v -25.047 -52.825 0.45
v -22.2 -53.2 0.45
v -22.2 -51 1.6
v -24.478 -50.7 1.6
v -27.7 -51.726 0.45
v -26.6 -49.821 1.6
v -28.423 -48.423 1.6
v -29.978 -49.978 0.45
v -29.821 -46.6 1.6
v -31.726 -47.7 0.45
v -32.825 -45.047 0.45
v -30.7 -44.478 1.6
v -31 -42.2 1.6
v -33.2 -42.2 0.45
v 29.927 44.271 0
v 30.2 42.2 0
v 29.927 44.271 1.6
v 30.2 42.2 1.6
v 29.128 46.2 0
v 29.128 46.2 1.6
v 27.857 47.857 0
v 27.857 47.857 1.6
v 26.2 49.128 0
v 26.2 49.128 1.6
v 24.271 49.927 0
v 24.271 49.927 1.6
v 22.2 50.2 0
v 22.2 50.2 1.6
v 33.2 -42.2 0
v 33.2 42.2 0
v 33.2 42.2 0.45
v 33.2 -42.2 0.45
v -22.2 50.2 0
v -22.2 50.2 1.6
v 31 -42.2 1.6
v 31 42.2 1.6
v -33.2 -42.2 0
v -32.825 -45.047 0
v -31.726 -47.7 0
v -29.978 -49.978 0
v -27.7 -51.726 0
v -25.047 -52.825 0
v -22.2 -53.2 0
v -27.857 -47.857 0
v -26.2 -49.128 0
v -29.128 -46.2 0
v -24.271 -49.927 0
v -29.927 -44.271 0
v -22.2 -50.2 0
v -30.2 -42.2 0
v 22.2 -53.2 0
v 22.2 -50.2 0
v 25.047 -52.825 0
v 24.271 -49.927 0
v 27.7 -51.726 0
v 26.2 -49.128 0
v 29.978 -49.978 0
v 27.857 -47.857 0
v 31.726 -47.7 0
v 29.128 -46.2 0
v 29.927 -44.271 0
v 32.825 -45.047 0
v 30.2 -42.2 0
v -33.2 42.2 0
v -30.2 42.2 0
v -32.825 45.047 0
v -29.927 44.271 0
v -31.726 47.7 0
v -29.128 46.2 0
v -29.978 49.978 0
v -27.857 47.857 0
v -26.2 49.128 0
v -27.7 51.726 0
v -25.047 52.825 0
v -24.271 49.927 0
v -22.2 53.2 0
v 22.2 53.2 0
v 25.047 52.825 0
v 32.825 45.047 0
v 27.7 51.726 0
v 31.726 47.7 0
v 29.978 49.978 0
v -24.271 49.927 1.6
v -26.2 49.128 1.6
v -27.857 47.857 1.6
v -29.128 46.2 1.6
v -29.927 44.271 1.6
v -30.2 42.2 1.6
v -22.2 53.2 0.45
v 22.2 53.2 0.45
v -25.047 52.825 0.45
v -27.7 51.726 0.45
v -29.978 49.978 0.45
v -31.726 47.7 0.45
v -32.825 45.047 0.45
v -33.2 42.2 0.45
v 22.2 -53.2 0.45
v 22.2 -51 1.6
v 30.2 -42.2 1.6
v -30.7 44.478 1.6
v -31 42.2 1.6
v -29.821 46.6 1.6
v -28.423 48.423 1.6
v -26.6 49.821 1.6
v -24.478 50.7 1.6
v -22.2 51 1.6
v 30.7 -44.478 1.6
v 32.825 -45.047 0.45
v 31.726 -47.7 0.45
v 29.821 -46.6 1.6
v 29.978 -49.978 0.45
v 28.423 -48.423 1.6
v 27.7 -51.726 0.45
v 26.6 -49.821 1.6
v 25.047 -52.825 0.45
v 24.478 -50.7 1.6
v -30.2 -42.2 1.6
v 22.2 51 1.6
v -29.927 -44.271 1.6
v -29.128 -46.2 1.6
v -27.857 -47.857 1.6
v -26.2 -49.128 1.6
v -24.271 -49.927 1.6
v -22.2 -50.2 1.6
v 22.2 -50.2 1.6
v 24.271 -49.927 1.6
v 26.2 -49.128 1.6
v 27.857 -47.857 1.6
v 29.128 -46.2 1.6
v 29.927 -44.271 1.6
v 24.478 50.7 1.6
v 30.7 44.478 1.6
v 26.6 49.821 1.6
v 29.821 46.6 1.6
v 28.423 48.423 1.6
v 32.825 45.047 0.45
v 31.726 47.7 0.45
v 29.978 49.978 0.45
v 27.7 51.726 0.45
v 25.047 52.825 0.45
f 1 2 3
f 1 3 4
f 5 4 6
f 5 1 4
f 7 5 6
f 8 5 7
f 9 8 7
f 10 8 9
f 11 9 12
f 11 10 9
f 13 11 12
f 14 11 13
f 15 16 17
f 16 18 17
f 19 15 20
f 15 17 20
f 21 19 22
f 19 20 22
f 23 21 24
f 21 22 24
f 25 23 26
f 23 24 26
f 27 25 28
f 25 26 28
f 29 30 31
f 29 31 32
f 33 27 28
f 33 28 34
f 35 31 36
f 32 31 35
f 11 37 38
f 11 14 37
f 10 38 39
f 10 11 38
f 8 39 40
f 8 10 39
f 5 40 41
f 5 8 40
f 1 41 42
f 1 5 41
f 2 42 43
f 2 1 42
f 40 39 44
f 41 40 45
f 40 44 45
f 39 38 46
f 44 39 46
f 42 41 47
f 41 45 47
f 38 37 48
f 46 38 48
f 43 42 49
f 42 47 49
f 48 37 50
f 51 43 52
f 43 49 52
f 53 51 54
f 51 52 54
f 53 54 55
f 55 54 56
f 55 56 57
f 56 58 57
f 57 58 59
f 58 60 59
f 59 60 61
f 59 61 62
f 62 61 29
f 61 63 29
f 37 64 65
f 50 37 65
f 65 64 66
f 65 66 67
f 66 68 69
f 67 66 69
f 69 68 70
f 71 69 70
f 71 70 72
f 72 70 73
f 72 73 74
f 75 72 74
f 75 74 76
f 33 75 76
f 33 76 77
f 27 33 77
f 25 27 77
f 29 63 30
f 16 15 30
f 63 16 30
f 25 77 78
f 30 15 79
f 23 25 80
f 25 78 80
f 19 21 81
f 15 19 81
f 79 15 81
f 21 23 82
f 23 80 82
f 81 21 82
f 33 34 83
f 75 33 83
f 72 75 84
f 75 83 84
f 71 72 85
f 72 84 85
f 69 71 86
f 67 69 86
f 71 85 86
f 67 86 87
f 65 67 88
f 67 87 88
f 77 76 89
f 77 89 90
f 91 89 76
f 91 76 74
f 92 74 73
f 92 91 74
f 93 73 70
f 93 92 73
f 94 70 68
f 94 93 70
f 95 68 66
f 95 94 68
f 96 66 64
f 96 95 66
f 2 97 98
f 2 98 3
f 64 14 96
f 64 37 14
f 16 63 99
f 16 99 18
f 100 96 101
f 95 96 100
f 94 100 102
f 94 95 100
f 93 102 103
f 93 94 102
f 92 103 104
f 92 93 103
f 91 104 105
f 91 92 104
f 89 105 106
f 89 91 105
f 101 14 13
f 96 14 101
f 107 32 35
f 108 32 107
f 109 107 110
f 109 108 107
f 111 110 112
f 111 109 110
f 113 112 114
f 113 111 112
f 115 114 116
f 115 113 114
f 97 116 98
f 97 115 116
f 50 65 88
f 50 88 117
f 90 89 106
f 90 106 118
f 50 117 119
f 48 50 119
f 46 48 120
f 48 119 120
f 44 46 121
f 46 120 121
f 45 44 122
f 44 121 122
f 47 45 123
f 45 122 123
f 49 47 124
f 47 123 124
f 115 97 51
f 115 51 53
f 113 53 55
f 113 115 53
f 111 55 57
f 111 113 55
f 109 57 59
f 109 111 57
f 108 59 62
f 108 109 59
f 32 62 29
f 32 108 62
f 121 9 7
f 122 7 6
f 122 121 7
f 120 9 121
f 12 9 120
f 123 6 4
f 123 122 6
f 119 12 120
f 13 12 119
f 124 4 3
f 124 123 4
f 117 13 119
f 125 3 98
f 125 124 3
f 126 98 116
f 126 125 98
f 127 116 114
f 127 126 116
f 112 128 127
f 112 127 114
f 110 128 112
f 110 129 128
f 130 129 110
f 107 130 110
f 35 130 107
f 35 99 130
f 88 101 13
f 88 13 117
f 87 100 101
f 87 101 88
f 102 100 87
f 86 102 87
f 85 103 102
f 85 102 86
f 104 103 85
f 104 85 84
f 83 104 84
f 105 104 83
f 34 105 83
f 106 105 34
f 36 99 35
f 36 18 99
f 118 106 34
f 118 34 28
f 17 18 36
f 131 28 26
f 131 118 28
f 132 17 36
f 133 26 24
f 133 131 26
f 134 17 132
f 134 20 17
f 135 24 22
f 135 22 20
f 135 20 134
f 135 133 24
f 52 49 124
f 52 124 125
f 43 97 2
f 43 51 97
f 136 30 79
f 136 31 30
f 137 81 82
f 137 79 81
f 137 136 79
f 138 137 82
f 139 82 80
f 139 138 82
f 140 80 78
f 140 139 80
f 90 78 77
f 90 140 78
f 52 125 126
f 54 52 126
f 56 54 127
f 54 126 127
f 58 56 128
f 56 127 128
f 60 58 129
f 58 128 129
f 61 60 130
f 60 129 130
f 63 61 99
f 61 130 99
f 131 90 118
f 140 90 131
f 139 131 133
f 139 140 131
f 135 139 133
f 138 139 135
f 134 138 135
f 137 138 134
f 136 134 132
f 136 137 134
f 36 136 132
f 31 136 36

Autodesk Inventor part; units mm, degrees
ref_plane "YZ Plane" through (0, 0, 0) normal (1, 0, 0) x (0, 1, 0)
ref_plane "XZ Plane" through (0, 0, 0) normal (0, 1, 0) x (-1, 0, 0)
ref_plane "XY Plane" through (0, 0, 0) normal (0, 0, 1) x (1, 0, 0)
sketch "Esquisse1" plane through (0, 0, 0) normal (0, 0, 1) x (1, 0, 0)
  line L0 (33.2, -53.2) -> (-33.2, -53.2)
  line L1 (-33.2, -53.2) -> (-33.2, 53.2)
  line L2 (-33.2, 53.2) -> (33.2, 53.2)
  line L3 (33.2, 53.2) -> (33.2, -53.2)
  line L4 (33.2, -53.2) -> (-33.2, 53.2) construction
  line L5 (-33.2, -53.2) -> (33.2, 53.2) construction
  line L6 (30.2, 50.2) -> (-30.2, 50.2)
  line L7 (-30.2, 50.2) -> (-30.2, -50.2)
  line L8 (-30.2, -50.2) -> (30.2, -50.2)
  line L9 (30.2, -50.2) -> (30.2, 50.2)
  point P0 (0, 0)
  dimension "d0" = 66.4
  dimension "d1" = 106.4
  dimension "d2" = 3
extrude "Extrusion1" add sketch "Esquisse1" along normal blind 1.6
fillet "Congé1" radius 11 4 edges at (-33.2, 53.2, 0.8) (33.2, 53.2, 0.8) (33.2, -53.2, 0.8) (-33.2, -53.2, 0.8)
fillet "Congé1" radius 8 4 edges at (30.2, -50.2, 0.8) (-30.2, -50.2, 0.8) (-30.2, 50.2, 0.8) (30.2, 50.2, 0.8)
chamfer "Chanfrein1" distance 2.2 distance2 1.15 8 edges at (-33.2, 0, 1.6) (-29.9782, -49.9782, 1.6) (0, -53.2, 1.6) (29.9782, -49.9782, 1.6) (33.2, 0, 1.6) (29.9782, 49.9782, 1.6) (0, 53.2, 1.6) (-29.9782, 49.9782, 1.6) measured on face at (-31.2, 14.0667, 1.6)
properties part number "FrontPanelBezel"
